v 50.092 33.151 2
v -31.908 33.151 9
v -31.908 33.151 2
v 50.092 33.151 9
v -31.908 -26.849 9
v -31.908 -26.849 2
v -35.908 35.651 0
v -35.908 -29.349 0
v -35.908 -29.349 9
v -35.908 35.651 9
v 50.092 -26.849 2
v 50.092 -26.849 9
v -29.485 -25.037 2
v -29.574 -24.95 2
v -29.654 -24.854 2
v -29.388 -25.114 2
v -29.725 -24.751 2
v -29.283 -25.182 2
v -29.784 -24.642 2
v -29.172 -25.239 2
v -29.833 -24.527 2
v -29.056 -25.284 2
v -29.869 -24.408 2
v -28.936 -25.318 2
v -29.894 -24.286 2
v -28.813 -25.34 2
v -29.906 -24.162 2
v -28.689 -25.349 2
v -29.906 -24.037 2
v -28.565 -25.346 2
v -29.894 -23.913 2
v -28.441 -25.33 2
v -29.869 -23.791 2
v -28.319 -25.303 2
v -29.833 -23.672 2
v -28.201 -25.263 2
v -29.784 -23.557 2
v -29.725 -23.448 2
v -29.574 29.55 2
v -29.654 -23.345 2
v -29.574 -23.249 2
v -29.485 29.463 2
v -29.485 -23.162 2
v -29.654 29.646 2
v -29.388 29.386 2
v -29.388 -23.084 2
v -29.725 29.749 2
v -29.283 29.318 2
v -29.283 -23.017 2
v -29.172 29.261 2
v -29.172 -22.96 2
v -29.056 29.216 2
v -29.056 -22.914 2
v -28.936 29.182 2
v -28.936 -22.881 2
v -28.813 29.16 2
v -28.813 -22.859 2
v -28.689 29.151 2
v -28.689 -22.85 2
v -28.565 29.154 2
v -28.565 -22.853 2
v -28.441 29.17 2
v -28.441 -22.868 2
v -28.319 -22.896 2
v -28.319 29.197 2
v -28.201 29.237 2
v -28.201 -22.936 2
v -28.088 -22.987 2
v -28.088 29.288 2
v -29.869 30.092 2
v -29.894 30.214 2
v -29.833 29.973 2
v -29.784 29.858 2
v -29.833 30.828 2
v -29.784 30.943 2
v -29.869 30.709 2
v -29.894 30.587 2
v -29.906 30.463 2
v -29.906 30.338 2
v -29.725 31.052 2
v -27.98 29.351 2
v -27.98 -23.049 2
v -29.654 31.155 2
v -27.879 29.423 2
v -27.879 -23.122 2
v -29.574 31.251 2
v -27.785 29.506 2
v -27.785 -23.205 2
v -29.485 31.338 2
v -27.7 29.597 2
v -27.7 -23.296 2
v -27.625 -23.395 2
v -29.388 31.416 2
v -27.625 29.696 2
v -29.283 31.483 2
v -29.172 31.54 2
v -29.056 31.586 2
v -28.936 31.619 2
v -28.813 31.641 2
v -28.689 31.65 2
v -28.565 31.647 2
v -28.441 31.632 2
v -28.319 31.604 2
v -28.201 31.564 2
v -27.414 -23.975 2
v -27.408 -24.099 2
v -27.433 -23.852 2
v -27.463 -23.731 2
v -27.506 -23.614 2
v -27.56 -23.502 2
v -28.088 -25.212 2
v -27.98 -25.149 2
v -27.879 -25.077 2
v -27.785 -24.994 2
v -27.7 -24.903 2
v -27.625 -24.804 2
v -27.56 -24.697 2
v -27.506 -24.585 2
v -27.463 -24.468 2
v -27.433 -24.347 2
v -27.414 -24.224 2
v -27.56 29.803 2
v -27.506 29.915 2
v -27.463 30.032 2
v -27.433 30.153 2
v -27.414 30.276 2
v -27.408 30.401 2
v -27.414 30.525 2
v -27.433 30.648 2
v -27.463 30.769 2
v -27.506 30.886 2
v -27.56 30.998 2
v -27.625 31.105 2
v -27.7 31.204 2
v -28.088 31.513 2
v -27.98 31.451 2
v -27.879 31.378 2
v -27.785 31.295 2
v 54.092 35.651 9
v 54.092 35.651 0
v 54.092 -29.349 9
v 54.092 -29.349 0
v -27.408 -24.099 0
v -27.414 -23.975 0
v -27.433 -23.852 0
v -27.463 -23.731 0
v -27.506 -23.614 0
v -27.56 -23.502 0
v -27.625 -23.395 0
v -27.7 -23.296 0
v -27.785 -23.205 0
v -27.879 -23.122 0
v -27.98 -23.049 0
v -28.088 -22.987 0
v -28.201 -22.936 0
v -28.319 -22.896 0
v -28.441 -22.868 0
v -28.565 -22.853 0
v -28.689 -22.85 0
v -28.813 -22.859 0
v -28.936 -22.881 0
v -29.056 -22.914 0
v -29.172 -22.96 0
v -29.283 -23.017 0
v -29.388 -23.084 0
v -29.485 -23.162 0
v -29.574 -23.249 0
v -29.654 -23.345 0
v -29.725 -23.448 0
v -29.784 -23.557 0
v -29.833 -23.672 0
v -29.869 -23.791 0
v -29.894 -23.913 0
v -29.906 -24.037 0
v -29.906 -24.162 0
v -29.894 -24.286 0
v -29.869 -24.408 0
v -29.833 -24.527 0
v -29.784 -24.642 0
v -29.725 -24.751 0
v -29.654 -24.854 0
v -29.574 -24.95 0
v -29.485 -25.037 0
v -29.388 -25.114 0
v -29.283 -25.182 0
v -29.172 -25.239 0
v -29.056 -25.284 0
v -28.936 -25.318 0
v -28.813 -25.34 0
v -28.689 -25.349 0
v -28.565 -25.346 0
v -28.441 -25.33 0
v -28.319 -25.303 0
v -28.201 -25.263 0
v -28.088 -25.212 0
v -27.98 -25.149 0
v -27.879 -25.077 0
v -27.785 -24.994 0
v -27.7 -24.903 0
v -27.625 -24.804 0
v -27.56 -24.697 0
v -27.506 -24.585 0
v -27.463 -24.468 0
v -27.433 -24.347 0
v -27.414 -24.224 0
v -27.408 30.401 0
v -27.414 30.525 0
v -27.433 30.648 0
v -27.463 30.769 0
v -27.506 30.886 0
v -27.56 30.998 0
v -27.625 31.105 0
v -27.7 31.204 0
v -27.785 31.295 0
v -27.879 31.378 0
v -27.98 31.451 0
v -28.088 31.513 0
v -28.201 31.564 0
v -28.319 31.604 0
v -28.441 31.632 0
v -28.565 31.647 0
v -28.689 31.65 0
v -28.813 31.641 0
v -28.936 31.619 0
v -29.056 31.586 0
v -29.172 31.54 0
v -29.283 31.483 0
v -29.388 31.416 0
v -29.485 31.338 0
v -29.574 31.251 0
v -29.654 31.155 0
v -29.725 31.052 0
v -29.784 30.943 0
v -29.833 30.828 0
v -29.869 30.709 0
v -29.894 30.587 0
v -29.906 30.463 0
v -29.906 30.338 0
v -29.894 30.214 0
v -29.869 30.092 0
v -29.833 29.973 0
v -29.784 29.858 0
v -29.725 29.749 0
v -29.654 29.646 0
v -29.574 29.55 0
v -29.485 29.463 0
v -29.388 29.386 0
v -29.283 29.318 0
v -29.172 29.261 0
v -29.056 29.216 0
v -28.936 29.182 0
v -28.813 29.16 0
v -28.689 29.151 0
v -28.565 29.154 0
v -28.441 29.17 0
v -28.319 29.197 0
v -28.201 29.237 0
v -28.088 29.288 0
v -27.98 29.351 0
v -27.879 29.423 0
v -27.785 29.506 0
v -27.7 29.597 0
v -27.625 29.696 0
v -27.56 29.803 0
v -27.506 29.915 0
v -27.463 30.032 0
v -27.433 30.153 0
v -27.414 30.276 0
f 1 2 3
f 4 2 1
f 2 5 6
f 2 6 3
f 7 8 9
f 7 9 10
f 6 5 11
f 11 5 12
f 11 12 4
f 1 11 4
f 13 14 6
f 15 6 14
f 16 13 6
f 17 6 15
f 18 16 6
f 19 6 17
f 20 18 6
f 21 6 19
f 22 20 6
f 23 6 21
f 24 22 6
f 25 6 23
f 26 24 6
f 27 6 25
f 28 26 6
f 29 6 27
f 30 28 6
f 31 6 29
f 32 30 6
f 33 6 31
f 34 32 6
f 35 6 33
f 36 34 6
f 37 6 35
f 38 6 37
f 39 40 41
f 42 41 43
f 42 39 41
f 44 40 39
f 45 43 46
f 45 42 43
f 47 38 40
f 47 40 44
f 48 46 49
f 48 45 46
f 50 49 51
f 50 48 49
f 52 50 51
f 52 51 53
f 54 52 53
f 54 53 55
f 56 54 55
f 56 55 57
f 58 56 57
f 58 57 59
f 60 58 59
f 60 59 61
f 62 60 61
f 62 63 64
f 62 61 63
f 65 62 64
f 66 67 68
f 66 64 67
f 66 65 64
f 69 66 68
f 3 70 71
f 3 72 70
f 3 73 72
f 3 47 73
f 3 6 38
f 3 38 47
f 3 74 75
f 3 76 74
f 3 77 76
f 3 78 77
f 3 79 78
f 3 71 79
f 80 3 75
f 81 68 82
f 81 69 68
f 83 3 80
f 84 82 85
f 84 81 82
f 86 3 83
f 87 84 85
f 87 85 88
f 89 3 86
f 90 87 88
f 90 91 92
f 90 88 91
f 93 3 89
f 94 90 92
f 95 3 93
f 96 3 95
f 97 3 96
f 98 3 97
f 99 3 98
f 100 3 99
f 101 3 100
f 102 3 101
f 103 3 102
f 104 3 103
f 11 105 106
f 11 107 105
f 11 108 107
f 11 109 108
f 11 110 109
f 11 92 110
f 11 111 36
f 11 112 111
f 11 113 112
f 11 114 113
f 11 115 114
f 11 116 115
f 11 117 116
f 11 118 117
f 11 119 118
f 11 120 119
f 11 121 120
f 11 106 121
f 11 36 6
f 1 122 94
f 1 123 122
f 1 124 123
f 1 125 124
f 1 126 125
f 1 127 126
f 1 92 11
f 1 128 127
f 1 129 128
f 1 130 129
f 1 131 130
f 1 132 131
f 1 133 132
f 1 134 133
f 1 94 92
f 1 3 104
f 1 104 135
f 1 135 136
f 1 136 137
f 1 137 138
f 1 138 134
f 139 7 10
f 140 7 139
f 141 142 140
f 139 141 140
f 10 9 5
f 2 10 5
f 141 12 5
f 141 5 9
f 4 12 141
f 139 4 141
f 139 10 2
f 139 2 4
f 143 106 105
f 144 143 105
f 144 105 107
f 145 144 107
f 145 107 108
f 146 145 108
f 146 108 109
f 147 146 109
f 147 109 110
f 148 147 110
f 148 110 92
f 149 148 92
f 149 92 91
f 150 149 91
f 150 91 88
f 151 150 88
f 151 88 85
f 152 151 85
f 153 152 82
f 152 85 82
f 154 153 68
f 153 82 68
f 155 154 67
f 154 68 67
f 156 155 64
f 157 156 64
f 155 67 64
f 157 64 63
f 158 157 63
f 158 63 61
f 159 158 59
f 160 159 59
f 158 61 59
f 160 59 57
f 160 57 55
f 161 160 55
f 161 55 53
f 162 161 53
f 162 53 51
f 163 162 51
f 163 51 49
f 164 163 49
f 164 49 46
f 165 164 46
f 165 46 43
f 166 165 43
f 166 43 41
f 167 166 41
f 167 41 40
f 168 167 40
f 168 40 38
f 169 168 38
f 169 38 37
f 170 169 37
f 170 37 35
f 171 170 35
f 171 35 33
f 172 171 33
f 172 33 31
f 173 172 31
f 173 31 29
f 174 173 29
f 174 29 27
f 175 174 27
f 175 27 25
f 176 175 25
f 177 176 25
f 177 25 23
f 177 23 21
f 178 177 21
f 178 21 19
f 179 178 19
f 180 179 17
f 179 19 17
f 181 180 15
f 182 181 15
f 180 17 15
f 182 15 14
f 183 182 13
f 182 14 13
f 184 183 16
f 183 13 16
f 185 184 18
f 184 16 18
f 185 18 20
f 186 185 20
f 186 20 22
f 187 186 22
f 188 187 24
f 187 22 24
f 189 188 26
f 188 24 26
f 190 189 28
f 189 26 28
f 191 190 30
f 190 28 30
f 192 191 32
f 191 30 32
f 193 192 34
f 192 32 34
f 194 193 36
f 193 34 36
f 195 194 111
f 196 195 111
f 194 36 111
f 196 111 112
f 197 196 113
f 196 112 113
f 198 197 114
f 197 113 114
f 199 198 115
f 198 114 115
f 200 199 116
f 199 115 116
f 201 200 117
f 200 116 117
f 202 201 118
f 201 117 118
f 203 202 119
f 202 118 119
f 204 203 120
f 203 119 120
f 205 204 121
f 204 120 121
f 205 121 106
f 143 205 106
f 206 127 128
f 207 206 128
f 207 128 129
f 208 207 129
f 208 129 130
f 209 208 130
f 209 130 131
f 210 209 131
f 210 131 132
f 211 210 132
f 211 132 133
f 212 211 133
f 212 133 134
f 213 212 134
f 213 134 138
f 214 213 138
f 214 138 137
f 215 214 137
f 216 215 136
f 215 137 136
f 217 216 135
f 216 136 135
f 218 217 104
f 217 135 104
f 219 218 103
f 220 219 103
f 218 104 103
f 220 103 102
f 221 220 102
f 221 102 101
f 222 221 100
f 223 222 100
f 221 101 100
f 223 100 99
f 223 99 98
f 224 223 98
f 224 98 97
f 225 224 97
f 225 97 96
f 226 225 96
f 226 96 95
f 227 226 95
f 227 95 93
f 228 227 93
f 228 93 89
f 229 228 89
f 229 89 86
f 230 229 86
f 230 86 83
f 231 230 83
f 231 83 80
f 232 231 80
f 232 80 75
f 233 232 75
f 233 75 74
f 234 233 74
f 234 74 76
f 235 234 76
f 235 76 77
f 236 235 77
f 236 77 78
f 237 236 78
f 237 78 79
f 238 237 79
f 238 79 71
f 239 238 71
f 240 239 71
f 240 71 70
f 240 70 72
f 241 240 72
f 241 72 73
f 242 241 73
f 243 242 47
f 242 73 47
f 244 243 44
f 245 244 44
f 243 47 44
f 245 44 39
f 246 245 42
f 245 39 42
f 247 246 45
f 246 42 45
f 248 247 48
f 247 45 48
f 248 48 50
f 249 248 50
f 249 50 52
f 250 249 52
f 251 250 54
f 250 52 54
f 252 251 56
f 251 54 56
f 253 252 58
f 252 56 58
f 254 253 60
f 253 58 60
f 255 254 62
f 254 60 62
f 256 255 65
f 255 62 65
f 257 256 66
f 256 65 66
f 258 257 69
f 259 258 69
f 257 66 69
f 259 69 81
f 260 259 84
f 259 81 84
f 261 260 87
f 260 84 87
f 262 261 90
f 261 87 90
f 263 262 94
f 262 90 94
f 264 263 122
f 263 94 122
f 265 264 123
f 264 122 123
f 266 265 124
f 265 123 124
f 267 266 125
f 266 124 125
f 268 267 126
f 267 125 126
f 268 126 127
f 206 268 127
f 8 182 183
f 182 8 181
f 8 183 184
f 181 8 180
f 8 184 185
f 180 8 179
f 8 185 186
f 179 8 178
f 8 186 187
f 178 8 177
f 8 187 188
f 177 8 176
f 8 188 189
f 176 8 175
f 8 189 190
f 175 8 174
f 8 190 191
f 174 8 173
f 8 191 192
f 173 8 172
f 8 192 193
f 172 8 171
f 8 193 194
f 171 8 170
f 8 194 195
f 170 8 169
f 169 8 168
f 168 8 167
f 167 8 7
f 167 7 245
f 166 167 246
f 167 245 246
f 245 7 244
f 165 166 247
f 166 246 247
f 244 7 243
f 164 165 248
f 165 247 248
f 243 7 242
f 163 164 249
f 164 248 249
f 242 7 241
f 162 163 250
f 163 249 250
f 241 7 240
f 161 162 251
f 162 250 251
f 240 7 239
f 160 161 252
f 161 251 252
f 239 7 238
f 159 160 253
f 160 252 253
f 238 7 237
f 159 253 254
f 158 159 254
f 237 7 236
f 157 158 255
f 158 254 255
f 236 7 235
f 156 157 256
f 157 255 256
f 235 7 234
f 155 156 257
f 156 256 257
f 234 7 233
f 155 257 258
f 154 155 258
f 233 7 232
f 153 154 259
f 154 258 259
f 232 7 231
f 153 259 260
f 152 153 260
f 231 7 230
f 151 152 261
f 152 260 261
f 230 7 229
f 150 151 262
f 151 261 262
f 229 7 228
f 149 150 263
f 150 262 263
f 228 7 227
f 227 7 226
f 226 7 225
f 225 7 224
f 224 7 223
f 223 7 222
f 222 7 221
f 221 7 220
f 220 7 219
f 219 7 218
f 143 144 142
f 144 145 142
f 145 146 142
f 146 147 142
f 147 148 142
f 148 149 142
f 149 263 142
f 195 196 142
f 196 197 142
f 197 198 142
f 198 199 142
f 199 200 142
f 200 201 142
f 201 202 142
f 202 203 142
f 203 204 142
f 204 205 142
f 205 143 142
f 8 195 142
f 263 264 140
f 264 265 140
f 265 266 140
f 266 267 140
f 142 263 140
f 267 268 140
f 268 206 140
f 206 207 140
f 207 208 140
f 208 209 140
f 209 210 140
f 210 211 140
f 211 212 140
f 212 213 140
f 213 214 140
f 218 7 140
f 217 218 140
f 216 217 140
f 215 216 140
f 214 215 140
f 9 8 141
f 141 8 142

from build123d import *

# Parameters (mm, degrees)
F0_W     = 90
F0_H     = 65
F1_DEPTH = 9
F2_W     = 82
F2_H     = 60
F3_DEPTH = 7
F4_R     = 1.25
F5_DEPTH = 2.001


with BuildPart() as f1:
    # F0 (on Top) → F1 (new body)
    with BuildSketch(Plane.XY):
        with Locations((9.092046, 3.150626)):
            Rectangle(F0_W, F0_H)
    extrude(amount=F1_DEPTH)

    # F2 (on face) → F3 (cut)
    with BuildSketch(Plane.XY.offset(9)):
        with Locations((9.092046, 3.150626)):
            Rectangle(F2_W, F2_H)
    extrude(amount=-F3_DEPTH, mode=Mode.SUBTRACT)

    # F4 (on face) → F5 (cut, through all)
    with BuildSketch(Plane.XY.offset(2)):
        with Locations((-28.657954, 30.400626)):
            Circle(F4_R)
        with Locations((-28.657954, -24.099374)):
            Circle(F4_R)
    extrude(amount=-F5_DEPTH, mode=Mode.SUBTRACT)


solid = f1.part
